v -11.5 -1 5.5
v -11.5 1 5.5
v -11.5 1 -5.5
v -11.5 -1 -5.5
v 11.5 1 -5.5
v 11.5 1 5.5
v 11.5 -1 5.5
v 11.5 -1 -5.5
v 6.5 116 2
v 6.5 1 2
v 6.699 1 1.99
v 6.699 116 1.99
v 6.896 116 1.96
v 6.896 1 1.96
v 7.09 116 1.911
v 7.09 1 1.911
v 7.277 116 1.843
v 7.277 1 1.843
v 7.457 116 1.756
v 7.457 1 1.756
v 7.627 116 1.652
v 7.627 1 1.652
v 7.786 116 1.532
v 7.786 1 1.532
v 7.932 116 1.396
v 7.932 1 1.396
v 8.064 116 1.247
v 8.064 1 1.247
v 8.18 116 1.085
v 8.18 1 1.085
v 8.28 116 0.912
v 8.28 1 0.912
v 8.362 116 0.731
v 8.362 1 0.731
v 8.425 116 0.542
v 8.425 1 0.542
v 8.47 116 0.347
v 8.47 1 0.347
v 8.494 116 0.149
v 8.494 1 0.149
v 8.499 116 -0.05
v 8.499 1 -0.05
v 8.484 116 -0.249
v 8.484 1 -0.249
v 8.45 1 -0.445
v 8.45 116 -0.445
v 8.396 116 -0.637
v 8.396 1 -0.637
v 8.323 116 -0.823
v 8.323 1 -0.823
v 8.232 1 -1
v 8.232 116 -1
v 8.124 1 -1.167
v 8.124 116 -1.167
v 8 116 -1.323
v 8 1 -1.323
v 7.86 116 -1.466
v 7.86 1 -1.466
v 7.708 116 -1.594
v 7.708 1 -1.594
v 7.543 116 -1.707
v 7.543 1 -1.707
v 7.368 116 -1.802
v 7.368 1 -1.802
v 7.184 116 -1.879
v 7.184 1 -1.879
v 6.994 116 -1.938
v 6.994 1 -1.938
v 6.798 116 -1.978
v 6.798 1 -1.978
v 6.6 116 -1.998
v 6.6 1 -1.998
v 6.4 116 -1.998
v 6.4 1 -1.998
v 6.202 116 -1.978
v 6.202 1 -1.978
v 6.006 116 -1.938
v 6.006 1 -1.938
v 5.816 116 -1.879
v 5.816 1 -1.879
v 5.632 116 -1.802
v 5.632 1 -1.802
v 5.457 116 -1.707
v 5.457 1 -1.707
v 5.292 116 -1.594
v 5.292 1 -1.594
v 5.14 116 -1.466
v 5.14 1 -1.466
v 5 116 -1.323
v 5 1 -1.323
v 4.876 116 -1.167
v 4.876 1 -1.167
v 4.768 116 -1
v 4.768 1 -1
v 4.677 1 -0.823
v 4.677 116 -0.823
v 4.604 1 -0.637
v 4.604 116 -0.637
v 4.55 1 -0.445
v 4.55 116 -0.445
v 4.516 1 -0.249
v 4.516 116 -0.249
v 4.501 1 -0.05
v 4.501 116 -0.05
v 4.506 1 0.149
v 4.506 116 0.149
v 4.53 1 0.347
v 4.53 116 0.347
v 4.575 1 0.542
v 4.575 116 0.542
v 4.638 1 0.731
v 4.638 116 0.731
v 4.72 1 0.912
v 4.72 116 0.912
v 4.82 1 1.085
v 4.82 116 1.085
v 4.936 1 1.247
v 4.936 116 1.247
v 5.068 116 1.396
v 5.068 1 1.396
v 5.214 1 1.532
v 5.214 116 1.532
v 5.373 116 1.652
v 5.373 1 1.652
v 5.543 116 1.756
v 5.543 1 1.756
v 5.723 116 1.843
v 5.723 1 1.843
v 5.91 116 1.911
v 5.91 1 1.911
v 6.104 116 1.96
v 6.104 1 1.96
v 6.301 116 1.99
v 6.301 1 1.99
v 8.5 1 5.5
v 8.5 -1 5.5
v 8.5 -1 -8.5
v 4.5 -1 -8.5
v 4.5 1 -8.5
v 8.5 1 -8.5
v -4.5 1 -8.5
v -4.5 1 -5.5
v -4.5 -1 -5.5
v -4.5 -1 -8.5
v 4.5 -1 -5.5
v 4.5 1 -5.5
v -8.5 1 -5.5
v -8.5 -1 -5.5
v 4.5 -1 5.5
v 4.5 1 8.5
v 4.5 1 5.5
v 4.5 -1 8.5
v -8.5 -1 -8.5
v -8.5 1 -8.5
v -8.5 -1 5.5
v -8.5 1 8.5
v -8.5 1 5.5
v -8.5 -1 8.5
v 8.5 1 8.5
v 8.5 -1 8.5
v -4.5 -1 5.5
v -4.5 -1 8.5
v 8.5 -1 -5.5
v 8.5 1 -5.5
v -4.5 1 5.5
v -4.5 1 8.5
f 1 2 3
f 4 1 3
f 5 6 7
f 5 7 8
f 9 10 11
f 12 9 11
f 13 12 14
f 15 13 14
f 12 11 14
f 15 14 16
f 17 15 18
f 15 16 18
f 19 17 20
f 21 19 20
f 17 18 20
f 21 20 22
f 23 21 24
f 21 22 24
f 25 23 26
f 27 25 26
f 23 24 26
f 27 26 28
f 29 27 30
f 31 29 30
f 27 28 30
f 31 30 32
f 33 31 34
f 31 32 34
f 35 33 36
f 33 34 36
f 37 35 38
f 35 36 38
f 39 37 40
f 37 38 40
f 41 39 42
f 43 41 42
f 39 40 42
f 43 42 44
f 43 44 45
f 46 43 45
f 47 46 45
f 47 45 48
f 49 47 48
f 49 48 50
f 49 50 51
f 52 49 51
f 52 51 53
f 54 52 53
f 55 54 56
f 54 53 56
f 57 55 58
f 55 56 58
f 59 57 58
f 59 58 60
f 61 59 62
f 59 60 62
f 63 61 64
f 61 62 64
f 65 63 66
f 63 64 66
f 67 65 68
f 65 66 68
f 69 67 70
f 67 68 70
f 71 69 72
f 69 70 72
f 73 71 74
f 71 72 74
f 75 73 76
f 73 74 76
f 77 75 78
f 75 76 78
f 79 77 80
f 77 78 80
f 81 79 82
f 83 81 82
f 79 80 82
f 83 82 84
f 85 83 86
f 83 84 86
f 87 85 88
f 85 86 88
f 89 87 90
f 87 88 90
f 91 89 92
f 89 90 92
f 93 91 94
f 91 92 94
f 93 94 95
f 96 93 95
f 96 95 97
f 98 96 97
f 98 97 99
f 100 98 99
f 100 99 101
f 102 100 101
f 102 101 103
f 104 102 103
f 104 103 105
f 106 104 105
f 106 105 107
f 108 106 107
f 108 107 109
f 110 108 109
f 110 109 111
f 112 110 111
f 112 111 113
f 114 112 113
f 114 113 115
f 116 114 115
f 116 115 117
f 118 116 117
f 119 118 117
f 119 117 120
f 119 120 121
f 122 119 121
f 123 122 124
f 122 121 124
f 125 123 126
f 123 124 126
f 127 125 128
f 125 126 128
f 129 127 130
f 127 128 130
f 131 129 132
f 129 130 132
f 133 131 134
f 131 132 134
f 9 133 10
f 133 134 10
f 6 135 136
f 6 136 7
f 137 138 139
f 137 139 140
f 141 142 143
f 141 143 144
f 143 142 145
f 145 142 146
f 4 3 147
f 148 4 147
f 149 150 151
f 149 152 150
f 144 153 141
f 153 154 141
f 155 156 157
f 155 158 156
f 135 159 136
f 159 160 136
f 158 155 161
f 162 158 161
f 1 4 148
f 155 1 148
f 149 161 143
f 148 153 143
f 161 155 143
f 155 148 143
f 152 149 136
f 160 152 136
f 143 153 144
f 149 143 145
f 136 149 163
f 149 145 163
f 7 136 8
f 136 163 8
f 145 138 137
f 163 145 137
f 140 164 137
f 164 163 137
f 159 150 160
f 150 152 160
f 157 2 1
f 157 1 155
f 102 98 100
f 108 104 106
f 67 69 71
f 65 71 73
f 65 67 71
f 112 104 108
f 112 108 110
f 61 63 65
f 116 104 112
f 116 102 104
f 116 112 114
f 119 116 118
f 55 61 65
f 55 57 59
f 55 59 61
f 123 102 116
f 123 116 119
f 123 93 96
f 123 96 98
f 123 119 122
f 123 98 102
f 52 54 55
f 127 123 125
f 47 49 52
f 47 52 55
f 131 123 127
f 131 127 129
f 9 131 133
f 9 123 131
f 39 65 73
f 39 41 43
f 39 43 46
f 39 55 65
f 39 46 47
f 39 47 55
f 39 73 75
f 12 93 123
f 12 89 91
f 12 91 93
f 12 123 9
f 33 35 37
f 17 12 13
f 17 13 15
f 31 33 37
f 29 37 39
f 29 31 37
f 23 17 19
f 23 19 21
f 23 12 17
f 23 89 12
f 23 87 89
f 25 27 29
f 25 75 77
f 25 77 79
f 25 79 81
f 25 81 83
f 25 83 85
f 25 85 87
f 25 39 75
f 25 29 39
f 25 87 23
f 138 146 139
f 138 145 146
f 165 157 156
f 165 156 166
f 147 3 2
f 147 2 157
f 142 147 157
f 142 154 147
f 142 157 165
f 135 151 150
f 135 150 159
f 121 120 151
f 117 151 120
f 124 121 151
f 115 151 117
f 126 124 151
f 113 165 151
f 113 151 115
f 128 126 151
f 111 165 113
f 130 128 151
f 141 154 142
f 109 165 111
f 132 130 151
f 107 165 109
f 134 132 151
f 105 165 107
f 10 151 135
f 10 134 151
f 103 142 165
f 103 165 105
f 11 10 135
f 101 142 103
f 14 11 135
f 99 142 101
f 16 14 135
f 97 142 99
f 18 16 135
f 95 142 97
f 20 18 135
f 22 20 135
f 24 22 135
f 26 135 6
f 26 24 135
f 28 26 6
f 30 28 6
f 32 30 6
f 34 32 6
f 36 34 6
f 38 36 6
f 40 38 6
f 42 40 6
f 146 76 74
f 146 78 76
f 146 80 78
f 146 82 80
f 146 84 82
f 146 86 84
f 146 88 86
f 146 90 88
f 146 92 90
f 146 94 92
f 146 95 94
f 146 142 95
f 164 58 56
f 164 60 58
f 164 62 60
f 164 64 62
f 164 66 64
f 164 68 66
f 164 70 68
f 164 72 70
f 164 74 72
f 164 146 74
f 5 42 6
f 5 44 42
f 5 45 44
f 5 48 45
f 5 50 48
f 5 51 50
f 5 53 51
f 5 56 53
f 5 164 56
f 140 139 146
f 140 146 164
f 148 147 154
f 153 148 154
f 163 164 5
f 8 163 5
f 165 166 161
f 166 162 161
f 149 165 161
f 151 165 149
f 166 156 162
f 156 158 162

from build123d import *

# Parameters (mm, degrees)
SKETCH1_W           = 23
SKETCH1_H           = 11
BOSS_EXTRUDE1_DEPTH = 1
SKETCH3_W           = 4
SKETCH3_H           = 3
BOSS_EXTRUDE3_DEPTH = 1
SKETCH2_R           = 2
BOSS_EXTRUDE2_DEPTH = 115


with BuildPart() as part:
    # Sketch1 → Boss-Extrude1 (new, symmetric)
    with BuildSketch(Plane(origin=(0, 0, 0), x_dir=(1, 0, 0), z_dir=(0, 1, 0))):
        Rectangle(SKETCH1_W, SKETCH1_H)
    extrude(amount=BOSS_EXTRUDE1_DEPTH, both=True)

    # Sketch3 → Boss-Extrude3 (add, symmetric)
    with BuildSketch(Plane(origin=(0, 0, 0), x_dir=(1, 0, 0), z_dir=(0, 1, 0))):
        with Locations((6.5, 7)):
            Rectangle(SKETCH3_W, SKETCH3_H)
        with Locations((6.5, -7)):
            Rectangle(SKETCH3_W, SKETCH3_H)
        with Locations((-6.5, -7)):
            Rectangle(SKETCH3_W, SKETCH3_H)
        with Locations((-6.5, 7)):
            Rectangle(SKETCH3_W, SKETCH3_H)
    extrude(amount=BOSS_EXTRUDE3_DEPTH, both=True)

    # Sketch2 → Boss-Extrude2 (add)
    with BuildSketch(Plane(origin=(0, 1, 0), x_dir=(1, 0, 0), z_dir=(0, 1, 0))):
        with Locations(Location((6.5, 0, 0), (0, 0, 270))):
            Circle(SKETCH2_R)
    extrude(amount=BOSS_EXTRUDE2_DEPTH)


solid = part.part
